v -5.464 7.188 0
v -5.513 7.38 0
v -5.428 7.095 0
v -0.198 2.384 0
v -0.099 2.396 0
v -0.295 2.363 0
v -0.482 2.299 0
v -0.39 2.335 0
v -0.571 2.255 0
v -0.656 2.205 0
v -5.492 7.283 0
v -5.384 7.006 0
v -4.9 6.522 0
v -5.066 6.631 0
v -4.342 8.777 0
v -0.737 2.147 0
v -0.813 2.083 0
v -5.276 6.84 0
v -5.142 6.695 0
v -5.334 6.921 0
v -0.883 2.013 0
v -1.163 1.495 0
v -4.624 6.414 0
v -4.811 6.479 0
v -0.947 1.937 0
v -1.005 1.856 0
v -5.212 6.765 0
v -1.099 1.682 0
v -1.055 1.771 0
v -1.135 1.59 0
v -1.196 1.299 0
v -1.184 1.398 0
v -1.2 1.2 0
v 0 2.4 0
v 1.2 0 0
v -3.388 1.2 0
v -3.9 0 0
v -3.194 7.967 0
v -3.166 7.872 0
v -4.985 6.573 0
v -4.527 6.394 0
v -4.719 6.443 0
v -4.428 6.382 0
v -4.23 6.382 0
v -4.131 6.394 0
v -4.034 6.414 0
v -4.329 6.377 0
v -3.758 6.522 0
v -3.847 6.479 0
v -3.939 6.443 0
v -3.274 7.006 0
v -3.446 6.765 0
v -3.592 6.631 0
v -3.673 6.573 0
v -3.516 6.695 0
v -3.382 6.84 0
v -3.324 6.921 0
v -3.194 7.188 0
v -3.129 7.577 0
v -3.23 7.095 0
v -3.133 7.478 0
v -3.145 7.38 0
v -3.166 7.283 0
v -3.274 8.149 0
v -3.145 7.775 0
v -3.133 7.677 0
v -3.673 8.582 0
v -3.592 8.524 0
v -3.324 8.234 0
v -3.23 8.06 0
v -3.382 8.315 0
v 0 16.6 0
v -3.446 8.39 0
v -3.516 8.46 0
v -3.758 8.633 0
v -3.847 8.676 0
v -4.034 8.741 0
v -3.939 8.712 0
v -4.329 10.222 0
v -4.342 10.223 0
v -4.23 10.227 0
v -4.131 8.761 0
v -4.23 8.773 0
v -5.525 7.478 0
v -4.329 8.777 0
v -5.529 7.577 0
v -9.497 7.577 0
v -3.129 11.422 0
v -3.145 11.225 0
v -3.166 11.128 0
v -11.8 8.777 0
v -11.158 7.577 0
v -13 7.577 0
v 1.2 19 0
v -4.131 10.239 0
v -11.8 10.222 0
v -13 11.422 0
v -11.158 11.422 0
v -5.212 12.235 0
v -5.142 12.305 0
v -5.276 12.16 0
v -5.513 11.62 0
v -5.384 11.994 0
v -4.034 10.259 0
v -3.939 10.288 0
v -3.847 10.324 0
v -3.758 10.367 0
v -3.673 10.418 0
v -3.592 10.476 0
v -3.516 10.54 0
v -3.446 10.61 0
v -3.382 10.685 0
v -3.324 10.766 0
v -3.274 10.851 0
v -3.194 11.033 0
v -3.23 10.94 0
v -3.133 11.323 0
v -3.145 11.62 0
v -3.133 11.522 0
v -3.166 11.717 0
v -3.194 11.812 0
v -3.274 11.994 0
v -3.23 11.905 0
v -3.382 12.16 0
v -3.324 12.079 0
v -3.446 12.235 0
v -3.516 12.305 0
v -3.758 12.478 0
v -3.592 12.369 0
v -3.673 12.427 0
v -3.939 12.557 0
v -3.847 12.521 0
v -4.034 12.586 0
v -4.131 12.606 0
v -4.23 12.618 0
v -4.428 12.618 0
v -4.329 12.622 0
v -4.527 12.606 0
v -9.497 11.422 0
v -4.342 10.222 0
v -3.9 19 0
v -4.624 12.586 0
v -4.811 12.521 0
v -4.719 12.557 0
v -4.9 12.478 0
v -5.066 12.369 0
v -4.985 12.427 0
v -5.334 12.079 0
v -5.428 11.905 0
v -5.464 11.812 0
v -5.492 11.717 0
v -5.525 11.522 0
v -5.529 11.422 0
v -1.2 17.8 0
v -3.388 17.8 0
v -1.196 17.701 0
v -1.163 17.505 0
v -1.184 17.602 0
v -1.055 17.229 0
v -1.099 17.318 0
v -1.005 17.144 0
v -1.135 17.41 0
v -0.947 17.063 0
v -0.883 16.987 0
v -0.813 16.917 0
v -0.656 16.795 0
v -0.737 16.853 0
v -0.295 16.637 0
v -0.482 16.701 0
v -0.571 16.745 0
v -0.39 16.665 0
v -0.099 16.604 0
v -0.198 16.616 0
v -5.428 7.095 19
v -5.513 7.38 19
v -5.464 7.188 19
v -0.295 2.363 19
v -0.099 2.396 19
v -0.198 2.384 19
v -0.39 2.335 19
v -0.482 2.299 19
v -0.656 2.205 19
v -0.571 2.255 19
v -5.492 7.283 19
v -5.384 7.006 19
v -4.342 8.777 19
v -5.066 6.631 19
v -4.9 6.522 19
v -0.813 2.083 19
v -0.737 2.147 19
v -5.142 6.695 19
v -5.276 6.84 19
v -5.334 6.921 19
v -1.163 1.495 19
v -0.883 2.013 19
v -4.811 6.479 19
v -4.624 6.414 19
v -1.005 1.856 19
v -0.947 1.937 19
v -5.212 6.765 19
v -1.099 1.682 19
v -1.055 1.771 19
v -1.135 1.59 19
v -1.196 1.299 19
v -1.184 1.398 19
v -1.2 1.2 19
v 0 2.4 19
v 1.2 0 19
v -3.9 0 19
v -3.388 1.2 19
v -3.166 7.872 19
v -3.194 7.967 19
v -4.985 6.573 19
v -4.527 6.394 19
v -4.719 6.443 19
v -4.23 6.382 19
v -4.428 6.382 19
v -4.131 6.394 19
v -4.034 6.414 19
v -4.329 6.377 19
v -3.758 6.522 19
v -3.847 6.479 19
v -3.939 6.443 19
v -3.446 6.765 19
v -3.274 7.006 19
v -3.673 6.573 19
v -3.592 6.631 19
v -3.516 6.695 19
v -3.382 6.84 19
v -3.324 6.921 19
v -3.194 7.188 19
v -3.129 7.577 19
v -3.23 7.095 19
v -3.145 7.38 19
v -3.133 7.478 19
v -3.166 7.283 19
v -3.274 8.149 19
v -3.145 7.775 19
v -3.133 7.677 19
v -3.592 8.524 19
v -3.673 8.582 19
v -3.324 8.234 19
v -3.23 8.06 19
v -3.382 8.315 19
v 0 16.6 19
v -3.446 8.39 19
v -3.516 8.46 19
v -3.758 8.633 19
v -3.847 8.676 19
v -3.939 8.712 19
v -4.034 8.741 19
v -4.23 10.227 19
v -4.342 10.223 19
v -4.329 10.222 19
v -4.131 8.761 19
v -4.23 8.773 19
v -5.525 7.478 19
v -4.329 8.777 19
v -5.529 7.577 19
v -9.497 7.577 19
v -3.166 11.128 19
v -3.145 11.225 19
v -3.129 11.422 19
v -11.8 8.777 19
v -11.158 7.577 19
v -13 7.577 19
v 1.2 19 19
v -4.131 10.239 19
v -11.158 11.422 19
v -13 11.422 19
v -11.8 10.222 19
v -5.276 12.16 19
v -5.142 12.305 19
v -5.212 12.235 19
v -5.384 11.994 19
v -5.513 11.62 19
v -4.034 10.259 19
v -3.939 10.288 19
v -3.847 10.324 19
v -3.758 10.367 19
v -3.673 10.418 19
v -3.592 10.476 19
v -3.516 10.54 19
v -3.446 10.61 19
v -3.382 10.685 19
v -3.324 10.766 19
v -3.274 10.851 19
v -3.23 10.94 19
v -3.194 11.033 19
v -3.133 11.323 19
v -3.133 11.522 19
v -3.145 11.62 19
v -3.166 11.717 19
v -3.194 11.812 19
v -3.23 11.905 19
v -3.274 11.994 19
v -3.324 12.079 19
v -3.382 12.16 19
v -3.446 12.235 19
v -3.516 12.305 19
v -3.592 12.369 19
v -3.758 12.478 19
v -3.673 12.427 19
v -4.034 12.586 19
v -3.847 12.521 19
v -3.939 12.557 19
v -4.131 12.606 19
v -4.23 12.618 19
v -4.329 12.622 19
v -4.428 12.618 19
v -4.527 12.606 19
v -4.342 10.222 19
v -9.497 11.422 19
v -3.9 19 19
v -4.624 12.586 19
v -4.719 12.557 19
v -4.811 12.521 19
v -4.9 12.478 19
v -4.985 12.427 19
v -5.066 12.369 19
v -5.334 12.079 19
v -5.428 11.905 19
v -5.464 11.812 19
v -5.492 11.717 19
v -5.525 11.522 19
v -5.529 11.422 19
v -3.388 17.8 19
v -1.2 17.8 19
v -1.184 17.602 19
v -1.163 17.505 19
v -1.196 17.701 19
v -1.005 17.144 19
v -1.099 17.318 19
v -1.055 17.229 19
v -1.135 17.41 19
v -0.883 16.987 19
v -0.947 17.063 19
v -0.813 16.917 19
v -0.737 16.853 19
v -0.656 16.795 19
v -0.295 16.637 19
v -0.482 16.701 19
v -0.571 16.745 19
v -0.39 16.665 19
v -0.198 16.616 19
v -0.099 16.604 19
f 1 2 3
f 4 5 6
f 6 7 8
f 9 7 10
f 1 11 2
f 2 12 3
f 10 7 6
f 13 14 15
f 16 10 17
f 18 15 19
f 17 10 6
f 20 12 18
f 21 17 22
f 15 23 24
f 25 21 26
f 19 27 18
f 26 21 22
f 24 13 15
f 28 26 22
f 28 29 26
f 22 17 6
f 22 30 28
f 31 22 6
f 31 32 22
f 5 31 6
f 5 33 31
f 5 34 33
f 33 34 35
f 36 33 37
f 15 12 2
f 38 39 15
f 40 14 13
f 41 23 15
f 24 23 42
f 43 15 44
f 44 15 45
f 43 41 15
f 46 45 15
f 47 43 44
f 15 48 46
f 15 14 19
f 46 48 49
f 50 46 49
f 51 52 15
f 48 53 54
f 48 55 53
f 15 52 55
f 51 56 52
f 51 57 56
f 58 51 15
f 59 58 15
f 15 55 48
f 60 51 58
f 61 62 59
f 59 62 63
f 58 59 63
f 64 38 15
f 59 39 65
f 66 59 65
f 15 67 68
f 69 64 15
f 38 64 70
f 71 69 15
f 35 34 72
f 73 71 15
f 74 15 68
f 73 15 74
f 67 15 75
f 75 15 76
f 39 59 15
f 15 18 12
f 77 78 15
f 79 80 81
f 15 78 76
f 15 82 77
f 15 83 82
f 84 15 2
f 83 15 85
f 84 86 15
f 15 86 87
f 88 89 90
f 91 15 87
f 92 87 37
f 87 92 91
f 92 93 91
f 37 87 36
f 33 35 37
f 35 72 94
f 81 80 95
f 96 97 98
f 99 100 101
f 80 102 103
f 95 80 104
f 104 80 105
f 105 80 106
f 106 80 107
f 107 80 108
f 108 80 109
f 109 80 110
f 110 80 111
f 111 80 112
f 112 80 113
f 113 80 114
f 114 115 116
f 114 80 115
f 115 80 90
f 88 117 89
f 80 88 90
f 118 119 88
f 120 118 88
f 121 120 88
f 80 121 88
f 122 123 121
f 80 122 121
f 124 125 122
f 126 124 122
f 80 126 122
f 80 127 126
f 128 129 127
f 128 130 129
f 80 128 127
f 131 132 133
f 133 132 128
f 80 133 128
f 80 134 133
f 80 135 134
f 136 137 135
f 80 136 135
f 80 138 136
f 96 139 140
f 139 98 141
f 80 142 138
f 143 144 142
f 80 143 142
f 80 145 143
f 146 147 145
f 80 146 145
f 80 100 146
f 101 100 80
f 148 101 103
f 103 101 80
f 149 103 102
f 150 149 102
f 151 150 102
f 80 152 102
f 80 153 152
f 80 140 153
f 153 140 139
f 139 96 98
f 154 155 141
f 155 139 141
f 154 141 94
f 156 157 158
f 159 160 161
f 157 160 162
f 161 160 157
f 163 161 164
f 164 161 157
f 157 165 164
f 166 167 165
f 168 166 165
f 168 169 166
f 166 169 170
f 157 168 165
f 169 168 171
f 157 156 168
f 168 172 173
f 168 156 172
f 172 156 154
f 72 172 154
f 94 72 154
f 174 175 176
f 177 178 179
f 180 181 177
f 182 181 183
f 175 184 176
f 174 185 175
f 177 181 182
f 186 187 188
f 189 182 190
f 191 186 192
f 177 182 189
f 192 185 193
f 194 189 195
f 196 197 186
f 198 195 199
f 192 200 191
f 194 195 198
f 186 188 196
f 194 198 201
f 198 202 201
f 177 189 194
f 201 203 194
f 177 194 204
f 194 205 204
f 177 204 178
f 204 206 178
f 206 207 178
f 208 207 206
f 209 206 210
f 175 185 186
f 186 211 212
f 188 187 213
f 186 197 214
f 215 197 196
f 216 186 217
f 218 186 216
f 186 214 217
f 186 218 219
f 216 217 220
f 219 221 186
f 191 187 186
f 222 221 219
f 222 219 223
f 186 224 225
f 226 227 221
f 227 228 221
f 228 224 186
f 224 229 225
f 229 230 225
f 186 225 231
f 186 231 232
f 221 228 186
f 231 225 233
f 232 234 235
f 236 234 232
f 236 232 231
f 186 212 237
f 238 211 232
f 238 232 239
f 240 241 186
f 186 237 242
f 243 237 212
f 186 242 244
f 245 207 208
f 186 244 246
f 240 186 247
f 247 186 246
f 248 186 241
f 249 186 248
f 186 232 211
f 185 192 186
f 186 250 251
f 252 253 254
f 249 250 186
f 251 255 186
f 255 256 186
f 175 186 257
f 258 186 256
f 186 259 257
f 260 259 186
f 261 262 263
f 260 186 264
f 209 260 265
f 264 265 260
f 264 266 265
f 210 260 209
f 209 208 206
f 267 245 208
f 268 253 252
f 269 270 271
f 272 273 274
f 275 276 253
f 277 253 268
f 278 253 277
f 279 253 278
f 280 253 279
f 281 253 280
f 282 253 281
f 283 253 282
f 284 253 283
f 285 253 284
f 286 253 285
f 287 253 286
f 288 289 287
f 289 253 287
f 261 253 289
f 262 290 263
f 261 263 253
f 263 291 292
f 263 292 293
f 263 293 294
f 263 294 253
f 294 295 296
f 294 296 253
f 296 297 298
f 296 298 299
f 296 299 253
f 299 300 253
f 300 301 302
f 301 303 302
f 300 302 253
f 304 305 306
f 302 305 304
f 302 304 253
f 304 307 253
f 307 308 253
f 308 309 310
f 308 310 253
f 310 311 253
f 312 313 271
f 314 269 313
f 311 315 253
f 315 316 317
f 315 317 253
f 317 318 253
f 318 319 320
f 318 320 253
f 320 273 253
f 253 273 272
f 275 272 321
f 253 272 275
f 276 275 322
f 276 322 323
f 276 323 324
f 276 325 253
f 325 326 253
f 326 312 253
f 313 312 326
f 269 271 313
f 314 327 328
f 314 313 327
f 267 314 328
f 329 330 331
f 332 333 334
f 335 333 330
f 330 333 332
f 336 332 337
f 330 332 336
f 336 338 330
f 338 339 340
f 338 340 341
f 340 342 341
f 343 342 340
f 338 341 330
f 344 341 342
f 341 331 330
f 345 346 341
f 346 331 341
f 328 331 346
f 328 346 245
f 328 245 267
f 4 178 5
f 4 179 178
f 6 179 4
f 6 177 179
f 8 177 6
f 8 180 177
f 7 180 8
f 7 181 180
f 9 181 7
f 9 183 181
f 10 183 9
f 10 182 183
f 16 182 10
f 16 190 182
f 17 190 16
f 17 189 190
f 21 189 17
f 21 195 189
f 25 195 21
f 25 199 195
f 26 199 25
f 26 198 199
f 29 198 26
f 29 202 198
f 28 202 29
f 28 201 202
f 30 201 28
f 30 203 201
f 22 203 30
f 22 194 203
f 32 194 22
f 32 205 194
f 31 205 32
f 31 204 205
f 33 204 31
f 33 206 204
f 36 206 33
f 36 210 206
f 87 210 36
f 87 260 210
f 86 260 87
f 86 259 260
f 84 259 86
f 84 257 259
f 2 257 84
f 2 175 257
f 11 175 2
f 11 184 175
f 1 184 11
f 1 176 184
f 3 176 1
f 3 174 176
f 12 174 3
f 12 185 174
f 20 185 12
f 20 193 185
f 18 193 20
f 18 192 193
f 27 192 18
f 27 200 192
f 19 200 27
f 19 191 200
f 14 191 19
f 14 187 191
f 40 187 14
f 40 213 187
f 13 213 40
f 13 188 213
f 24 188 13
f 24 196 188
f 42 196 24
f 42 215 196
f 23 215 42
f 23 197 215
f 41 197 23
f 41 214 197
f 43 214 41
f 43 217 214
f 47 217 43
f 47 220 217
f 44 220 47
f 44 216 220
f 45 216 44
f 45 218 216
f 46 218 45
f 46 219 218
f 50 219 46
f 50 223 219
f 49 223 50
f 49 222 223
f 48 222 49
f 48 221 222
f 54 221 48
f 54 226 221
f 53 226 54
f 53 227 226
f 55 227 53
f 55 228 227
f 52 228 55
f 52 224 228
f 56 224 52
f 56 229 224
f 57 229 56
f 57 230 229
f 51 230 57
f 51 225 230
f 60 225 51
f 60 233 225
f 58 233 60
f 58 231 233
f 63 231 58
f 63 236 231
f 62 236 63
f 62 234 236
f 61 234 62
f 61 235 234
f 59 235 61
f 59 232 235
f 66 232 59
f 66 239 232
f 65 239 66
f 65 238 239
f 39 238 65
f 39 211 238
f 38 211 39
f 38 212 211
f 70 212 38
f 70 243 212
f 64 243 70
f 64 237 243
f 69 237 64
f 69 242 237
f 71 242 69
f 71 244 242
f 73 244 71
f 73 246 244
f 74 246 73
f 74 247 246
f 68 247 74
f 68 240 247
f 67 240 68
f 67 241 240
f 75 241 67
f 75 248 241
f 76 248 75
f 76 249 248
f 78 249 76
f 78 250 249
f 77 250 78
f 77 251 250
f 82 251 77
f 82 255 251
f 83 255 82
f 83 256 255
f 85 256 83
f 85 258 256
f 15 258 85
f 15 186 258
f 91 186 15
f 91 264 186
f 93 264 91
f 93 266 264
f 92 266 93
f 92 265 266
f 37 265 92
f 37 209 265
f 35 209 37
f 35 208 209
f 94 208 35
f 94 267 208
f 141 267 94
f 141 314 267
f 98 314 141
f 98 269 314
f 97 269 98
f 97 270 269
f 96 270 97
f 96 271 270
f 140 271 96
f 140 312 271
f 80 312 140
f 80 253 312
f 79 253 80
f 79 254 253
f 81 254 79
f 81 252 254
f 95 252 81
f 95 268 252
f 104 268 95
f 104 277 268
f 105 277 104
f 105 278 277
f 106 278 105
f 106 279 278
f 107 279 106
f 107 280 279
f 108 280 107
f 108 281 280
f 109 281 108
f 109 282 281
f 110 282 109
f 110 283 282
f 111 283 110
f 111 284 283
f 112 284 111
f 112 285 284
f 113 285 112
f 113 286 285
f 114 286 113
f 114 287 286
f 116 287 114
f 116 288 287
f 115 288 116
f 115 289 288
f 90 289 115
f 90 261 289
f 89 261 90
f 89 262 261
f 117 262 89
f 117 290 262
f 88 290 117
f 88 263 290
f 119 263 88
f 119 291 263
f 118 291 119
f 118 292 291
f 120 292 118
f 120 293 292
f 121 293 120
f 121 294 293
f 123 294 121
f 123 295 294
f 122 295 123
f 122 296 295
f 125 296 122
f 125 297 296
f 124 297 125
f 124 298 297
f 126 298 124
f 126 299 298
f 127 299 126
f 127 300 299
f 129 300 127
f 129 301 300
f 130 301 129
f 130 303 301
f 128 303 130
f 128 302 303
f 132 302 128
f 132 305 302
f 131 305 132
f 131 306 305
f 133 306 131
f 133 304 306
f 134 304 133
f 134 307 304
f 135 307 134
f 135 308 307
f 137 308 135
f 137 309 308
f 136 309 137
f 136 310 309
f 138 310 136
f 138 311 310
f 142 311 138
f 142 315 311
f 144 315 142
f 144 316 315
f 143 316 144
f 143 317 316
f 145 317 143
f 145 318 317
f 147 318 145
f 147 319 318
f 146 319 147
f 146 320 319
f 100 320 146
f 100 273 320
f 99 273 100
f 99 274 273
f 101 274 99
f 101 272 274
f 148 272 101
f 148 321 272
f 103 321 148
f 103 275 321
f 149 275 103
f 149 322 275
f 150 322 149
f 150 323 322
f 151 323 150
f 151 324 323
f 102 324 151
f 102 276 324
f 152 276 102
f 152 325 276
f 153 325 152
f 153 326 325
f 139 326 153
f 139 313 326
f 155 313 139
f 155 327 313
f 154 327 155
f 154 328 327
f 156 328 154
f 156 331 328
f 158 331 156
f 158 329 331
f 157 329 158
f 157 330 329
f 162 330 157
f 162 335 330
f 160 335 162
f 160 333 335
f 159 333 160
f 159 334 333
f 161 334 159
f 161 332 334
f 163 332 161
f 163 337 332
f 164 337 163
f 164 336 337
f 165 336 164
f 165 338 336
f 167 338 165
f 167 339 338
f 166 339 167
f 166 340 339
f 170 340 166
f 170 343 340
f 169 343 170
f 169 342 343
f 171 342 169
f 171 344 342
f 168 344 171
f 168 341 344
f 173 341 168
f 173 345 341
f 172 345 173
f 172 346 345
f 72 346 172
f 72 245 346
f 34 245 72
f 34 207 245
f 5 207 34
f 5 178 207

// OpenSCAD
// The length of the base, measured parallel with the gamepiece that will be inserted into it.
base_length = 19;

// The height of the base.
base_height = 13;

// The width of the base, measured perpendicular with gamepiece that will be inserted into it.
base_width = 19;

// The thickness of the gamepiece that will be inserted into the base.
insert_thickness = 1.7;

// The thickness of the walls of the base.
wall_thickness = 1.2;

module game_piece_base(
    base_length=0,
    base_height=0,
    base_width=0,
    insert_thickness=0,
    wall_thickness=0
    ) {
        $fs = .1;
        $fa = .1;
        
        insert_opening = insert_thickness * .85;
        
        linear_extrude(height=base_length) difference() {
            union() {
                // Base
                square([wall_thickness, base_width]);
                
                // Left side
                rotate([0, 0, 90]) square([wall_thickness, base_height * .3]);
                // Right side
                translate([0, base_width - wall_thickness, 0])
                    rotate([0, 0, 90]) square([wall_thickness, base_height * .3]);
               
                roof_angle = atan((base_height * .7) / (base_width / 2));
                roof_length = sqrt( pow(base_height * .7, 2) + pow( base_width / 2, 2 ) );
                
                // Left roof
                intersection() {
                    translate([-base_height * .3, 0, 0]) rotate([0, 0, roof_angle]) square([wall_thickness, roof_length]);
                    translate([-base_height, 0, 0]) square([base_height, base_width / 2]);
                }
                // Right roof
                intersection() {
                    translate([-base_height * .3, base_width, 0]) rotate([0, 0, -roof_angle]) translate([0, -roof_length, 0]) square([wall_thickness, roof_length]);
                    translate([-base_height, base_width/2, 0]) square([base_height, base_width / 2]);
                }
                
                // Sides of the insert cutout
                translate([-base_height, (base_width - ((insert_opening) + (2 * wall_thickness)))/ 2, 0]) square([base_height * .666, insert_opening + (2 * wall_thickness)]); 
                
                // Bottom left circle fillet
                translate([0, wall_thickness, 0]) circle(r=wall_thickness);
                
                // Bottom right circle fillet
                translate([0, base_width - wall_thickness, 0]) circle(r=wall_thickness);
                
                // Circles at the bottom of the insert supports.
                translate([-base_height * .333, (base_width / 2)-wall_thickness-(insert_opening/2), 0]) circle(r=wall_thickness);
                translate([-base_height * .333, (base_width / 2)+wall_thickness+(insert_opening/2), 0]) circle(r=wall_thickness);
            }
            
            // Insert cutout
            translate([0, (base_width - (insert_opening)) / 2, 0]) rotate([0, 0, 90]) square([insert_opening, base_height]);
            
            diamond_cutout_hypotenuse = (wall_thickness * 2) + (insert_opening);
            diamond_cutout_side_length = sqrt( pow( diamond_cutout_hypotenuse, 2) / 2 );
            
            // Top angled cutout
            translate([-base_height, base_width / 2 - (diamond_cutout_hypotenuse/2), 0]) rotate([0, 0, 45]) square([diamond_cutout_side_length, diamond_cutout_side_length]);
        }
}

game_piece_base(
    base_length=base_length,
    base_height=base_height,
    base_width=base_width,
    insert_thickness=insert_thickness,
    wall_thickness=wall_thickness
);
